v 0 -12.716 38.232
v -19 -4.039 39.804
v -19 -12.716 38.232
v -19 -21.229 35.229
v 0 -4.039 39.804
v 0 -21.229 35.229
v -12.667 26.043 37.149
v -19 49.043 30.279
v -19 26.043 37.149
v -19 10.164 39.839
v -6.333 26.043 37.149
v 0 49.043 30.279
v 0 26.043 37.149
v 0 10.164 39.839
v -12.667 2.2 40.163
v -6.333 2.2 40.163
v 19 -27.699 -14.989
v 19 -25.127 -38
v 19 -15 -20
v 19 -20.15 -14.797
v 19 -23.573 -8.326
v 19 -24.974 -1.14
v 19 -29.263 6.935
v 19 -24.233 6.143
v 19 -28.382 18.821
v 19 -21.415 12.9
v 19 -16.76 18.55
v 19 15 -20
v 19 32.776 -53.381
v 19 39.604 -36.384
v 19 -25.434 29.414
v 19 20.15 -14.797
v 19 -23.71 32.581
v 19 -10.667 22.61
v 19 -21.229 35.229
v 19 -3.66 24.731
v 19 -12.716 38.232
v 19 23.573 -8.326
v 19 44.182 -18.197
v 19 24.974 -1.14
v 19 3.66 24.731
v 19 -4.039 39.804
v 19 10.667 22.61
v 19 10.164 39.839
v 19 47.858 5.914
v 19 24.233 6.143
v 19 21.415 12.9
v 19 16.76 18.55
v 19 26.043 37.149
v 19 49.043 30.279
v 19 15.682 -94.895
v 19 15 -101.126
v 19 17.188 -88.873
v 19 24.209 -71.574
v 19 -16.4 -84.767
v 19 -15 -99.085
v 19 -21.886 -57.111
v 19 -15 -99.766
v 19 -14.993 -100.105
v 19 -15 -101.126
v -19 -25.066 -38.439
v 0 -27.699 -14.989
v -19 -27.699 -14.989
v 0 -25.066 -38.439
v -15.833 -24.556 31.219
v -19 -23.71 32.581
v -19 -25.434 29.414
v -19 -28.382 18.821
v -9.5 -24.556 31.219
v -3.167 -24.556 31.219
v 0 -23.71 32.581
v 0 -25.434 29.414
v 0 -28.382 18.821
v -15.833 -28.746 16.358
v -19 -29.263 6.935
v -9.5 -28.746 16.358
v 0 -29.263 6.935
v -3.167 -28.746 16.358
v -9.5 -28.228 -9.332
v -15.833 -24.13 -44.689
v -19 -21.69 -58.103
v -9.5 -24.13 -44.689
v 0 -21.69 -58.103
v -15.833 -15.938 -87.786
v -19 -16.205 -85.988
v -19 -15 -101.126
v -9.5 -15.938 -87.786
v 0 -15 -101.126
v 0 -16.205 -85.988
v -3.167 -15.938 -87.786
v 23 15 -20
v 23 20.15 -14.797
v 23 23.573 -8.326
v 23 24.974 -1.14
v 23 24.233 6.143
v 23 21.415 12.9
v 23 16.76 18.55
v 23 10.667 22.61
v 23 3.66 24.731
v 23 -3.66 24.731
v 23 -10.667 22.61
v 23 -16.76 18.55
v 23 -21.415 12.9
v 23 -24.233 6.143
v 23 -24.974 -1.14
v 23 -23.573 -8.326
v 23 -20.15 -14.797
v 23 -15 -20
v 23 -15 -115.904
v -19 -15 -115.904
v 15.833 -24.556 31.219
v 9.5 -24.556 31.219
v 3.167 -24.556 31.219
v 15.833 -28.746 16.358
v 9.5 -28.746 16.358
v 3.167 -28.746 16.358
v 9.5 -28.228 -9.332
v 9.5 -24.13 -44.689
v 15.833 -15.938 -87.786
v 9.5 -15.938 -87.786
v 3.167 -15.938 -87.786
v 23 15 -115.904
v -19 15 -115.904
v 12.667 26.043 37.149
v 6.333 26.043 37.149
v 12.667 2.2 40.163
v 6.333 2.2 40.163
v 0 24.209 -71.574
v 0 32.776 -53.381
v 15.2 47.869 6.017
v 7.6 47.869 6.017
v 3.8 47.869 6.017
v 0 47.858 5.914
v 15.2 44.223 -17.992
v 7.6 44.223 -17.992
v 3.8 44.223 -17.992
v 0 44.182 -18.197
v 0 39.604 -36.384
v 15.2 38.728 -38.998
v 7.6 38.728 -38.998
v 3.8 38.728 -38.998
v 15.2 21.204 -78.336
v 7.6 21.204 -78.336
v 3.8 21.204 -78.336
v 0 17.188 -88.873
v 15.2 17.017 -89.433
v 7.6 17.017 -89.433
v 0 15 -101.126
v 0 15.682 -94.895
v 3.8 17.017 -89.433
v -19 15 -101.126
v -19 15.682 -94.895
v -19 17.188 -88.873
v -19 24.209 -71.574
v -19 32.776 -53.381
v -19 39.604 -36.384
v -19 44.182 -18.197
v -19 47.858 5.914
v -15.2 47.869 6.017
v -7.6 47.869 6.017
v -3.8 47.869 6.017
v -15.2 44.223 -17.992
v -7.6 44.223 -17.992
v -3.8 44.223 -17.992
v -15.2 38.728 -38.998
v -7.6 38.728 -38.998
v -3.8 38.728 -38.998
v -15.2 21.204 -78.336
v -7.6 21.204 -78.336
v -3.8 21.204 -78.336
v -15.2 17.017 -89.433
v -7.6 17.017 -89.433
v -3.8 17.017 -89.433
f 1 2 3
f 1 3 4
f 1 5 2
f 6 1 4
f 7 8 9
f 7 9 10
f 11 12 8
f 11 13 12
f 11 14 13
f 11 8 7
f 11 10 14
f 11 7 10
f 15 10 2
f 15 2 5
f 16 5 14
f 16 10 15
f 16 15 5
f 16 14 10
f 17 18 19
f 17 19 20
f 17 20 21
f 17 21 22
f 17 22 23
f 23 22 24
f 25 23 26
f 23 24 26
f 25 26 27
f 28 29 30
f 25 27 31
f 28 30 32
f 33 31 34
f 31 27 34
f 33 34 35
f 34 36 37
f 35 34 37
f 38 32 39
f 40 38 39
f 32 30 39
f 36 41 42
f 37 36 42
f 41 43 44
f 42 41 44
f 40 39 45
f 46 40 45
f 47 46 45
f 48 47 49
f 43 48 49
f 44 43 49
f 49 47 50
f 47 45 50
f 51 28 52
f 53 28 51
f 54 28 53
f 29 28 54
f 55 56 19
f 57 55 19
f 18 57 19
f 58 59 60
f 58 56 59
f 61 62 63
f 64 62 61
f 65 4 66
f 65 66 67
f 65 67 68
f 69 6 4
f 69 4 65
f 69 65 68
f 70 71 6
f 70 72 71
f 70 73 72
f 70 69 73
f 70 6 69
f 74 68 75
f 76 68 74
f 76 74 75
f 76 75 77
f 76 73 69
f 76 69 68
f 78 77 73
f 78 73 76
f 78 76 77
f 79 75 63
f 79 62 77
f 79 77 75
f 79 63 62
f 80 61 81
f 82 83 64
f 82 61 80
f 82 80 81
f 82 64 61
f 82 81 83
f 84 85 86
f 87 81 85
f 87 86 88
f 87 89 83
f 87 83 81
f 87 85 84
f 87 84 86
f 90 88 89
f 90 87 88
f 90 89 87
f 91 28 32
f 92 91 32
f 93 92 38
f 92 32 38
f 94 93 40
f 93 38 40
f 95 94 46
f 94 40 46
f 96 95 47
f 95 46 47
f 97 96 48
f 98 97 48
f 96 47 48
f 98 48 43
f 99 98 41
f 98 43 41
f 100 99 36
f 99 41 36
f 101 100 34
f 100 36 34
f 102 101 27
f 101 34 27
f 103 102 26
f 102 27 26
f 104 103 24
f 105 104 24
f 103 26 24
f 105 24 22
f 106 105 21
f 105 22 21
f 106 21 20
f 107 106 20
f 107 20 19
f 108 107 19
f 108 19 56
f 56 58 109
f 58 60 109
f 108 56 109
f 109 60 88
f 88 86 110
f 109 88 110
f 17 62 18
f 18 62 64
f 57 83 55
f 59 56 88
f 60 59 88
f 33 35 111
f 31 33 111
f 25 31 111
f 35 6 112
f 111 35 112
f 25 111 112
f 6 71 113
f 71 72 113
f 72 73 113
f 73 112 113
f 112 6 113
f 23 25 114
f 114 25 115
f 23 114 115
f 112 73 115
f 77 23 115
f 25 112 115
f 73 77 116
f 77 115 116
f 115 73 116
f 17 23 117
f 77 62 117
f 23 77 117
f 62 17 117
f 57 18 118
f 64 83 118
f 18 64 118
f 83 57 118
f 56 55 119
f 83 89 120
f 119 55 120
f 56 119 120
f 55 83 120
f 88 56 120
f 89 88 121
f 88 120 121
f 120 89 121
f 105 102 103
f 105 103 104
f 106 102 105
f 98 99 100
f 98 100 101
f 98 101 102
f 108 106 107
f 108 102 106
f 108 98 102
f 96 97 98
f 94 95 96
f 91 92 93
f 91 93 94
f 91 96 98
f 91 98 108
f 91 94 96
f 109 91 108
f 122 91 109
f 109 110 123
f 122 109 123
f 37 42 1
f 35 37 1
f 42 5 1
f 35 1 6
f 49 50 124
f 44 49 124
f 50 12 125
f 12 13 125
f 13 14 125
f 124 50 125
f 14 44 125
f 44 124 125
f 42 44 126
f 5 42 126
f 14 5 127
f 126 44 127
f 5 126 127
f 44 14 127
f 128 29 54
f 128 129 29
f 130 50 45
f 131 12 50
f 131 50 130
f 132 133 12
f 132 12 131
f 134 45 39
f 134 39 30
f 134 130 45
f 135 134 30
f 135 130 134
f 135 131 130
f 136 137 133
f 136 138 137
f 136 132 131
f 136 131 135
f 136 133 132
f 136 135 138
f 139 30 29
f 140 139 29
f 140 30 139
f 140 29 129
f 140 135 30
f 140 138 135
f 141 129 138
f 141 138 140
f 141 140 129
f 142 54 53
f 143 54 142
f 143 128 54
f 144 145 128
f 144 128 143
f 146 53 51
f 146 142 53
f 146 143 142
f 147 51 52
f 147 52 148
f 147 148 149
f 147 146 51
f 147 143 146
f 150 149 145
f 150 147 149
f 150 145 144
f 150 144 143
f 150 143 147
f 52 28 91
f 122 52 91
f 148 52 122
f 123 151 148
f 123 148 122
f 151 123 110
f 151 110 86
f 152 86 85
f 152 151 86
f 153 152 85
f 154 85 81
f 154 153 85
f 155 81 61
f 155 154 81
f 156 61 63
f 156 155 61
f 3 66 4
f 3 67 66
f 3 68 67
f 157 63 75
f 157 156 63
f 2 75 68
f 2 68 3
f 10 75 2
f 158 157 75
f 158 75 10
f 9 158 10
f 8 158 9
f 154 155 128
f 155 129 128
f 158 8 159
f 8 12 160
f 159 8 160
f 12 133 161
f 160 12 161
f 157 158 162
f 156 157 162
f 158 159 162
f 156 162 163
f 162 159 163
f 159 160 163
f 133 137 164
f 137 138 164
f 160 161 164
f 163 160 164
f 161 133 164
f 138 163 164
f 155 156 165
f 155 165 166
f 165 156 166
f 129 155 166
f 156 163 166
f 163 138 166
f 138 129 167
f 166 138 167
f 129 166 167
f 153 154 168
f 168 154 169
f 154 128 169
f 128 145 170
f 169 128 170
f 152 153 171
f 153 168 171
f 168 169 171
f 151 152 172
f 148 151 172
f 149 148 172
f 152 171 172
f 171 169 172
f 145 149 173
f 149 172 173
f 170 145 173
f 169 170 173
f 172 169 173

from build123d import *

# Parameters (mm, degrees)
BOSS_EXTRUDE1_DEPTH      = 19
BOSS_EXTRUDE1_DEPTH_BACK = 19
SKETCH4_R                = 25
BOSS_EXTRUDE2_DEPTH      = 4
SKETCH7_W                = 96.334868302
SKETCH7_H                = 30
BOSS_EXTRUDE4_DEPTH      = 4


with BuildPart() as part:
    # Sketch3 → Boss-Extrude1 (new, two sides: drawn at the far end of the back side and taken through both)
    with BuildSketch(Plane(origin=(0, 0, 0), x_dir=(0, 0, -1), z_dir=(1, 0, 0)).offset(-BOSS_EXTRUDE1_DEPTH_BACK)):
        with BuildLine():
            Line((101.125836247, 15), (115.903665145, 15))
            Line((115.903665145, 15), (115.903665145, -15))
            Line((115.903665145, -15), (101.125836247, -15))
            add(Edge.make_bspline(
                [(-35.228525995, -21.228719453), (-33.006450865, -24.07111779), (-26.49753273, -26.863412426), (-11.335277797, -30.129234604), (12.719064979, -27.929719806), (43.096683762, -25.057564772), (73.387051738, -18.43106409), (92.126866656, -14.867150153), (101.125836247, -15)],
                knots=[0, 0, 0, 0, 0.075207413, 0.148741353, 0.333288022, 0.588928464, 0.80810625, 1, 1, 1, 1], degree=3))
            add(Edge.make_bspline(
                [(-30.278821492, 49.042821653), (-37.712518178, 26.883259009), (-45.501408919, 1.573924427), (-35.228525995, -21.228719453)],
                knots=[0, 0, 0, 0, 1, 1, 1, 1], degree=3))
            add(Edge.make_bspline(
                [(-30.278821492, 49.042821653), (-14.032986644, 49.168084942), (9.286633448, 46.599377579), (40.599784556, 39.089257371), (60.084206577, 29.540337779), (80.216148289, 20.129950878), (93.055643568, 15.237102325), (101.125836247, 15)],
                knots=[0, 0, 0, 0, 0.354356982, 0.512751412, 0.701525574, 0.826928454, 1, 1, 1, 1], degree=3))
        make_face()
    extrude(amount=BOSS_EXTRUDE1_DEPTH + BOSS_EXTRUDE1_DEPTH_BACK)

    # Sketch4 → Boss-Extrude2 (add)
    with BuildSketch(Plane(origin=(19, 0, 0), x_dir=(0, 0, -1), z_dir=(1, 0, 0))):
        Circle(SKETCH4_R)
    extrude(amount=BOSS_EXTRUDE2_DEPTH)

    # Sketch7 → Boss-Extrude4 (add)
    with BuildSketch(Plane(origin=(19, 0, 0), x_dir=(0, 0, -1), z_dir=(1, 0, 0))):
        with Locations((67.736230994, 0)):
            Rectangle(SKETCH7_W, SKETCH7_H)
    extrude(amount=BOSS_EXTRUDE4_DEPTH)


solid = part.part
